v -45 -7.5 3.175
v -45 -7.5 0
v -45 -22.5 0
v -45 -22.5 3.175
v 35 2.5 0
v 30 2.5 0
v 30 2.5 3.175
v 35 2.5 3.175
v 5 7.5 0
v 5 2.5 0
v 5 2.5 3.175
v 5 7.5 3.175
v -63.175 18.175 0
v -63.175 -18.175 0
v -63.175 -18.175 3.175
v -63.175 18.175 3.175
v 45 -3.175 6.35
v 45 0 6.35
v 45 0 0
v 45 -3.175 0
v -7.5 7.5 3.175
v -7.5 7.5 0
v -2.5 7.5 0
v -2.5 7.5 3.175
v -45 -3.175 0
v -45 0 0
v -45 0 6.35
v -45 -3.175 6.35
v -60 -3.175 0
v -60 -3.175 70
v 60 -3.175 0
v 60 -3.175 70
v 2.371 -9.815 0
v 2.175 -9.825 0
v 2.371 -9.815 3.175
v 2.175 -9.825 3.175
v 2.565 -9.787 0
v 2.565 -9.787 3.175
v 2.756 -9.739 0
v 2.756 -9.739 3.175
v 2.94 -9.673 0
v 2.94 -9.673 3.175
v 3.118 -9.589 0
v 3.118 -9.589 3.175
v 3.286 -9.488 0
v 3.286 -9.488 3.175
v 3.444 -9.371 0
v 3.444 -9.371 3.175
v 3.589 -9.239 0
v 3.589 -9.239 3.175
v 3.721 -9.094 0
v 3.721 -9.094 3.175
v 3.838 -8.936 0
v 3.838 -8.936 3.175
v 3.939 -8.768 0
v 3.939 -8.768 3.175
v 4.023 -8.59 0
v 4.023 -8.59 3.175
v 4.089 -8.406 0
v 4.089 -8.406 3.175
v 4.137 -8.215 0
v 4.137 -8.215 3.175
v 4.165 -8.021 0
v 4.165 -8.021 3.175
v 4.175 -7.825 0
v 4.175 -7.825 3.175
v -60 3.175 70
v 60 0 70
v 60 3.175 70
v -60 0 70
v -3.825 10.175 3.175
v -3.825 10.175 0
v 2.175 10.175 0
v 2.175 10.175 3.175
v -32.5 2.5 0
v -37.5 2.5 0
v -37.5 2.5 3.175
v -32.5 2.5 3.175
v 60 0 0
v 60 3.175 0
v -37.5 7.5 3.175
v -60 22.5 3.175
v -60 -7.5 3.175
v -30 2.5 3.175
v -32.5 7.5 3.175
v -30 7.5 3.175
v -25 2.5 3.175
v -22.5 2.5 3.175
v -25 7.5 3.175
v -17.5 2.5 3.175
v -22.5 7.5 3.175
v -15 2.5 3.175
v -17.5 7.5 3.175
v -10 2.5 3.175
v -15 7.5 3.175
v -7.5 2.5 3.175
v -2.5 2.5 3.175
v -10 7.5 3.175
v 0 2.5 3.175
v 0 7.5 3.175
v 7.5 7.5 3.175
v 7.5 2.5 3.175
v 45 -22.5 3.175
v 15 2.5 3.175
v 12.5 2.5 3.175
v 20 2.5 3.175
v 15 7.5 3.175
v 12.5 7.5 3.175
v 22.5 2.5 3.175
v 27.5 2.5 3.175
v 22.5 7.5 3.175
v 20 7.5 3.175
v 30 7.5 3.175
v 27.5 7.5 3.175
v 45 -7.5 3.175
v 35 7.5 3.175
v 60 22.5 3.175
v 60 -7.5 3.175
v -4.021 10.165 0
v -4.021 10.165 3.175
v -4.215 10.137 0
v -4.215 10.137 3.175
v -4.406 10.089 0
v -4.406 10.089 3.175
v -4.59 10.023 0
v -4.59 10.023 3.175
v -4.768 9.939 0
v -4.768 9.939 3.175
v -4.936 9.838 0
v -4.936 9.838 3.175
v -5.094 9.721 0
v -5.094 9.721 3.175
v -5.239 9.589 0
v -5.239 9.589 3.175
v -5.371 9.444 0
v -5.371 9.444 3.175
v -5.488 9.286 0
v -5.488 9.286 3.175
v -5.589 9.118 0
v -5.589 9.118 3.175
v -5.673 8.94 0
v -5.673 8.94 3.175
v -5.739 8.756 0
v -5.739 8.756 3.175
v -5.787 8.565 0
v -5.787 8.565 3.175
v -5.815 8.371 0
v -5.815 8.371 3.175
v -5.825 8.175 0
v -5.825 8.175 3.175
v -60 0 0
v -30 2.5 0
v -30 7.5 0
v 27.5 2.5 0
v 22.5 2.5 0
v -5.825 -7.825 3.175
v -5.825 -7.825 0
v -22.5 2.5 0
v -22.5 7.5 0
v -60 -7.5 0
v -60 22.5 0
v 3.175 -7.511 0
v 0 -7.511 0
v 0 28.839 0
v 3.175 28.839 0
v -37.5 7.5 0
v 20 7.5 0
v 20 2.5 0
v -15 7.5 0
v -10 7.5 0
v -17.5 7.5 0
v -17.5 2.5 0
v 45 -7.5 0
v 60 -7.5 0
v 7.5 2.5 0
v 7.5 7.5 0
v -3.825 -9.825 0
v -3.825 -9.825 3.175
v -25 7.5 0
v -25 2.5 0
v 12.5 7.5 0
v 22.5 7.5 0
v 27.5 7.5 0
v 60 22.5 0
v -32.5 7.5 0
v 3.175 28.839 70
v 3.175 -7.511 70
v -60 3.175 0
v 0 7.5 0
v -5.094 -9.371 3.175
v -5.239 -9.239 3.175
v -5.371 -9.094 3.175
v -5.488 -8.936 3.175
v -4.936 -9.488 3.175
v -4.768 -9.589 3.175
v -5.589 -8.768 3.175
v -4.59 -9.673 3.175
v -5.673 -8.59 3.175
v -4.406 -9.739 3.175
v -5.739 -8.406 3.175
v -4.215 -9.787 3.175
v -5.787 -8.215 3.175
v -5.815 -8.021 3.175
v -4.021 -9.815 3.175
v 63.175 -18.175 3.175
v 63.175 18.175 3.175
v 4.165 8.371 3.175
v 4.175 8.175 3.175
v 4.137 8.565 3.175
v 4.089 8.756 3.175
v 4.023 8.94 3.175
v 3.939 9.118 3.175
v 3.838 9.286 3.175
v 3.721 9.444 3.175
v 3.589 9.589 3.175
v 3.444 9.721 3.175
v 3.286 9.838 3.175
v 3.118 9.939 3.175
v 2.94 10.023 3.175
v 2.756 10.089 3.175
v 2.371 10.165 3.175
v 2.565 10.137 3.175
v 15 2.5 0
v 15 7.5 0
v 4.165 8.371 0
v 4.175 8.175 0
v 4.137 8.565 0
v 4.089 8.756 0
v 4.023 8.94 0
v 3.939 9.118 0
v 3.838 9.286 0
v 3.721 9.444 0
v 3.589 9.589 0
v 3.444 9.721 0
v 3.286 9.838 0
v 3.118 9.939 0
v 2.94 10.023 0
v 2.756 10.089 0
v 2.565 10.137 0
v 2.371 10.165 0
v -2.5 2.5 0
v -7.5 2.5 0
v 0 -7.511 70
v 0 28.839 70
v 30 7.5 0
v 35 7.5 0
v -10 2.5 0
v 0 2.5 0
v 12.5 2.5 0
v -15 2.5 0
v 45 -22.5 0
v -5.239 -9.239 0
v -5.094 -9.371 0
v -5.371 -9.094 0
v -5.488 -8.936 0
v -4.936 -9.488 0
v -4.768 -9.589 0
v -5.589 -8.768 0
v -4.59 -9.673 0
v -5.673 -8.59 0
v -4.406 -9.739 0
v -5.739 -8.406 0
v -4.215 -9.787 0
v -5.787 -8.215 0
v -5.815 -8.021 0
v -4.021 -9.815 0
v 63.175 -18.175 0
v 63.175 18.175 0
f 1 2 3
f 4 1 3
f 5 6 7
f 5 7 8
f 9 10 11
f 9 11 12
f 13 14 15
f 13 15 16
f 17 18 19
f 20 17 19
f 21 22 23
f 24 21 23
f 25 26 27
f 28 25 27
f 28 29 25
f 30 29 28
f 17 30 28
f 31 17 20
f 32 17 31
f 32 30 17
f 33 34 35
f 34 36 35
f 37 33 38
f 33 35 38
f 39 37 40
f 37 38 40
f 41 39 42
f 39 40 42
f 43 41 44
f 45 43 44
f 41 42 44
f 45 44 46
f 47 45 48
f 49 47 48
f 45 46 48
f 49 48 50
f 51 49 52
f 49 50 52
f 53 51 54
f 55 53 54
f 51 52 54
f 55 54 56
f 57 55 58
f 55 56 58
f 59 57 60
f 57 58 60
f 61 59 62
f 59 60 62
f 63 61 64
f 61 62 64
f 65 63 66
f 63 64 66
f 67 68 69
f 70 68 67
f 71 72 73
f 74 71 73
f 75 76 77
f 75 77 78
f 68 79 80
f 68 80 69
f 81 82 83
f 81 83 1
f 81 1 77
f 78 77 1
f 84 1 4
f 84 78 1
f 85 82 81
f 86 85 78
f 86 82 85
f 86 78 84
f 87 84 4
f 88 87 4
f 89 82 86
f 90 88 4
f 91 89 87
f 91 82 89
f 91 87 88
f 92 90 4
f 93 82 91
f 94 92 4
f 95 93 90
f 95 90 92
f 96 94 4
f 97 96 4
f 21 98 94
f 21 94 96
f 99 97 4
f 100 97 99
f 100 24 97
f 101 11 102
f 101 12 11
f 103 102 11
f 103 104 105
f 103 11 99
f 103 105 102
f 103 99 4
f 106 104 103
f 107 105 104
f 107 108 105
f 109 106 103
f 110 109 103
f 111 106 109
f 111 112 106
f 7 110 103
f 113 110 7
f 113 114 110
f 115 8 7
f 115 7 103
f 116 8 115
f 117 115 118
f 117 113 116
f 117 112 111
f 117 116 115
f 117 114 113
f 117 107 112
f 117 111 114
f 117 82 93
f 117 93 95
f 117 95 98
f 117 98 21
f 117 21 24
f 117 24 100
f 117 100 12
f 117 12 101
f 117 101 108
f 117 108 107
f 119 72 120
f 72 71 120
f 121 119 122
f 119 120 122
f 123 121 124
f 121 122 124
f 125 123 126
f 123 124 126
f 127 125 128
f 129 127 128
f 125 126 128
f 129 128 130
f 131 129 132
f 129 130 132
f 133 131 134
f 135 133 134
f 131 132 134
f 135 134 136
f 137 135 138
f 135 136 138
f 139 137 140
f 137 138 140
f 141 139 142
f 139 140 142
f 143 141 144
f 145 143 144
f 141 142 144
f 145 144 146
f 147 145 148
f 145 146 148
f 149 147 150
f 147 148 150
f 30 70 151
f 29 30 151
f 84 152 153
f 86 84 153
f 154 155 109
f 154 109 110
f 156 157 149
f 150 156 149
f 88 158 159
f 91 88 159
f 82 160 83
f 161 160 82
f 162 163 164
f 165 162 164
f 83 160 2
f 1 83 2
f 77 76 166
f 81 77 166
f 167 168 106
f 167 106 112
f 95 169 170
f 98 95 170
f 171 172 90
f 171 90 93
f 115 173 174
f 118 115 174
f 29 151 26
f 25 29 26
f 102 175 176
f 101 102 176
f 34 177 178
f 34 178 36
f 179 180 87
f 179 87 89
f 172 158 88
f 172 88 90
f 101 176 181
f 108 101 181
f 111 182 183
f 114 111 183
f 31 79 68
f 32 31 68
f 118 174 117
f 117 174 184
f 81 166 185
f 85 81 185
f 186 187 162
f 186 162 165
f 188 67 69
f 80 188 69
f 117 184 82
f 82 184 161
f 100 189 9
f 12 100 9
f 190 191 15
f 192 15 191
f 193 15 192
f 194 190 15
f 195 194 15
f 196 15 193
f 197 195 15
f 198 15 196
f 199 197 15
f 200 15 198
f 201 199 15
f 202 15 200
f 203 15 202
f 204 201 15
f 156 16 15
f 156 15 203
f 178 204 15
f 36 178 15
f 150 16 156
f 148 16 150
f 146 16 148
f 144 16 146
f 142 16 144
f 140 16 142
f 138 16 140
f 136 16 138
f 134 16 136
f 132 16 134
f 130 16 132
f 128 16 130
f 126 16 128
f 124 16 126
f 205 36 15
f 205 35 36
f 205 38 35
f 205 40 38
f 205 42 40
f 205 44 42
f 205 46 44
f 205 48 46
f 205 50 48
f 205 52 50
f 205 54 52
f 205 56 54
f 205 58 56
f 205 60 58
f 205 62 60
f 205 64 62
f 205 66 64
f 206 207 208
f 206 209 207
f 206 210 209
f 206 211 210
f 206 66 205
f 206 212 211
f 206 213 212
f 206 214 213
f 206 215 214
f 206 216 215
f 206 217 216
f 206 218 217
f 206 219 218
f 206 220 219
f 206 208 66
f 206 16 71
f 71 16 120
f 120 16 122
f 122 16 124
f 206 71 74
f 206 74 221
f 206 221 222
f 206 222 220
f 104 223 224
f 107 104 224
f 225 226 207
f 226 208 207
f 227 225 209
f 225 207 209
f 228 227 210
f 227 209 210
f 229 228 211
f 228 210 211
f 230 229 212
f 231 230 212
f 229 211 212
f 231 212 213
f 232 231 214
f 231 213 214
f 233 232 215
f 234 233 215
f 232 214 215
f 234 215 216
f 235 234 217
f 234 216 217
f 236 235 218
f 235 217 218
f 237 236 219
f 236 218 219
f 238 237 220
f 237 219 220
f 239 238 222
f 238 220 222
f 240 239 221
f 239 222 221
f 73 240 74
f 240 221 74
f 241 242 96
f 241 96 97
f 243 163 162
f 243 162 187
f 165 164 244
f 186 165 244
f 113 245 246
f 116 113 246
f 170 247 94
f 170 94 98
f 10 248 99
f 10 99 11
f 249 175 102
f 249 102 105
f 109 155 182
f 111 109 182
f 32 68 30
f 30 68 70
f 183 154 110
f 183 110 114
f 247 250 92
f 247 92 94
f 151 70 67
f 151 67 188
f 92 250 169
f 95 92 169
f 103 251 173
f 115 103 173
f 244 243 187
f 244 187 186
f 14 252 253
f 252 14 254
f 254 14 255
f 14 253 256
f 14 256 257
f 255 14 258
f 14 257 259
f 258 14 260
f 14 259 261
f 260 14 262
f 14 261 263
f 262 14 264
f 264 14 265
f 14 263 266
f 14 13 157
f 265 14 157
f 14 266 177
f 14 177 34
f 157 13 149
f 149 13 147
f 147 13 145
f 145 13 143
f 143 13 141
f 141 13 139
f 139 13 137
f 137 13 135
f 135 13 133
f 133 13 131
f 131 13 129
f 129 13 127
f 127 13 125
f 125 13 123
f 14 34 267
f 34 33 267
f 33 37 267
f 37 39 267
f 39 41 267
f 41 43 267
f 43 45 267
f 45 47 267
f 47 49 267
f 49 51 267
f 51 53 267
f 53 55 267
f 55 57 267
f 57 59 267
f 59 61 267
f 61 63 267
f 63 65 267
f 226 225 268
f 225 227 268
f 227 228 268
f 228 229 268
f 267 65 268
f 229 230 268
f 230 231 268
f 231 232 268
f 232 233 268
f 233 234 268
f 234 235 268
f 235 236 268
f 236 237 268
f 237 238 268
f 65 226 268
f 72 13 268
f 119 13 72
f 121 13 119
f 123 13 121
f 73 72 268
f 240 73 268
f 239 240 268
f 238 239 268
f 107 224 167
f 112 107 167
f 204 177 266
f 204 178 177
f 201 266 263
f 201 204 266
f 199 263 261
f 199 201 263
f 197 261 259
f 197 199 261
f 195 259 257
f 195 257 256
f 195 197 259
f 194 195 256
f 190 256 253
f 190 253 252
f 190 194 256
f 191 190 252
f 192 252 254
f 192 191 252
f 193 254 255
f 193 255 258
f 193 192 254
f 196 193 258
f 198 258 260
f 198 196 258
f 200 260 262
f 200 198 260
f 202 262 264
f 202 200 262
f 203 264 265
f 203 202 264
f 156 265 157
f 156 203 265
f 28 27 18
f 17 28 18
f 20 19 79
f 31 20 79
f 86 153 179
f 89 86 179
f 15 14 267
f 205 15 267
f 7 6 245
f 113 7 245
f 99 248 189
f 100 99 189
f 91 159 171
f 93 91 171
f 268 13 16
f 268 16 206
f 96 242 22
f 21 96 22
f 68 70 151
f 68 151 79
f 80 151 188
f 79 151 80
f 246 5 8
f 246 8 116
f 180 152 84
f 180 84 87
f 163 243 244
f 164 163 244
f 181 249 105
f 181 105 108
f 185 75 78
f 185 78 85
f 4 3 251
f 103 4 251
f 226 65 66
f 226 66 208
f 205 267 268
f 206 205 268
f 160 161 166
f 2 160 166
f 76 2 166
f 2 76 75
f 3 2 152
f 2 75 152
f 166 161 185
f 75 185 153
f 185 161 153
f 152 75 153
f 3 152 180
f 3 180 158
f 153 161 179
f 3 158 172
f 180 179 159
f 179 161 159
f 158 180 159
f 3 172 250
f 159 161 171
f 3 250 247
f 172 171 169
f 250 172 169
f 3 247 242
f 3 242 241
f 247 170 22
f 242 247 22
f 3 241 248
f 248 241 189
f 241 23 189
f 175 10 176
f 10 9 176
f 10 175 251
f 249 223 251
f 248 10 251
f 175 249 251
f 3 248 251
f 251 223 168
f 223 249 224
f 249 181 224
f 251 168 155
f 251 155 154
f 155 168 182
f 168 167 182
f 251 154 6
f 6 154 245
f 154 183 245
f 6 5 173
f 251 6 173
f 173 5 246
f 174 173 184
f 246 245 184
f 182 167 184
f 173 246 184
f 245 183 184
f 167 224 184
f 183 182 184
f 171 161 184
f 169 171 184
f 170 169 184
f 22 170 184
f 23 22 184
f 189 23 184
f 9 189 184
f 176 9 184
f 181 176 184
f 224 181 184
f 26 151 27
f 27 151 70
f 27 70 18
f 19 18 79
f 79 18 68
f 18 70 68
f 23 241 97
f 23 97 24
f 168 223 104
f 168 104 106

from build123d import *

# Parameters (mm, degrees)
F0_W     = 15
F0_H     = 30
F0_W_2   = 5
F0_H_2   = 5
F1_DEPTH = 3.175
F3_DEPTH = 3.175
F2_W     = 90
F2_H     = 6.35
F4_DEPTH = 3.175
F5_W     = 36.35
F5_H     = 70
F6_DEPTH = 3.175
F7_W     = 126.35
F7_H     = 36.35
F7_W_2   = 10
F7_H_2   = 20
F8_DEPTH = 3.175
F9_R     = 2


# Not quite as in the source:
# - a feature names something its author has since deleted; it is built from what else it names


with BuildPart() as f1:
    # F0 (on Top) → F1 (new body)
    with BuildSketch(Plane.XY):
        with Locations((52.5, 7.5)):
            Rectangle(F0_W, F0_H)
        with Locations((-52.5, 7.5)):
            Rectangle(F0_W, F0_H)
        Polygon((-45, -22.5), (45, -22.5), (45, -7.5), (45, 22.5), (-45, 22.5), (-45, -7.5), (-45, -10.675), align=None)
        with Locations((-35, 5)):
            Rectangle(F0_W_2, F0_H_2, mode=Mode.SUBTRACT)
        with Locations((-27.5, 5)):
            Rectangle(F0_W_2, F0_H_2, mode=Mode.SUBTRACT)
        with Locations((-20, 5)):
            Rectangle(F0_W_2, F0_H_2, mode=Mode.SUBTRACT)
        with Locations((-12.5, 5)):
            Rectangle(F0_W_2, F0_H_2, mode=Mode.SUBTRACT)
        with Locations((-5, 5)):
            Rectangle(F0_W_2, F0_H_2, mode=Mode.SUBTRACT)
        with Locations((2.5, 5)):
            Rectangle(F0_W_2, F0_H_2, mode=Mode.SUBTRACT)
        with Locations((10, 5)):
            Rectangle(F0_W_2, F0_H_2, mode=Mode.SUBTRACT)
        with Locations((17.5, 5)):
            Rectangle(F0_W_2, F0_H_2, mode=Mode.SUBTRACT)
        with Locations((25, 5)):
            Rectangle(F0_W_2, F0_H_2, mode=Mode.SUBTRACT)
        with Locations((32.5, 5)):
            Rectangle(F0_W_2, F0_H_2, mode=Mode.SUBTRACT)
    extrude(amount=F1_DEPTH)


with BuildPart() as f3:
    # F2 (on Front) → F3 (new body)
    with BuildSketch(Plane.XZ):
        Polygon((-60, 70), (-60, 0), (-45, 0), (-45, 6.35), (45, 6.35), (45, 0), (60, 0), (60, 70), align=None)
    extrude(amount=F3_DEPTH)


with BuildPart() as f4:
    # F2 (on Front) → F4 (new body)
    with BuildSketch(Plane.XZ):
        Polygon((-60, 70), (-60, 0), (-45, 0), (-45, 6.35), (45, 6.35), (45, 0), (60, 0), (60, 70), align=None)
        with Locations((0, 3.175)):
            Rectangle(F2_W, F2_H)
    extrude(amount=-F4_DEPTH)


with BuildPart() as f6:
    # F5 (on Right) → F6 (new body)
    with BuildSketch(Plane.YZ):
        with Locations((10.6640724358, 35)):
            Rectangle(F5_W, F5_H)
    extrude(amount=F6_DEPTH)


with BuildPart() as f8:
    # F7 (on Top) → F8 (new body)
    with BuildSketch(Plane.XY):
        Rectangle(F7_W, F7_H)
        with Locations((-0.825, 0.175)):
            Rectangle(F7_W_2, F7_H_2, mode=Mode.SUBTRACT)
    extrude(amount=F8_DEPTH)

    # F9
    f9_edges = [f8.edges().sort_by_distance(p)[0] for p in [
        (-5.825, 10.175, 1.5875),
        (4.175, 10.175, 1.5875),
        (4.175, -9.825, 1.5875),
        (-5.825, -9.825, 1.5875),
    ]]
    fillet(f9_edges, radius=F9_R)


solid = Compound([f1.part, f3.part, f4.part, f6.part, f8.part])
